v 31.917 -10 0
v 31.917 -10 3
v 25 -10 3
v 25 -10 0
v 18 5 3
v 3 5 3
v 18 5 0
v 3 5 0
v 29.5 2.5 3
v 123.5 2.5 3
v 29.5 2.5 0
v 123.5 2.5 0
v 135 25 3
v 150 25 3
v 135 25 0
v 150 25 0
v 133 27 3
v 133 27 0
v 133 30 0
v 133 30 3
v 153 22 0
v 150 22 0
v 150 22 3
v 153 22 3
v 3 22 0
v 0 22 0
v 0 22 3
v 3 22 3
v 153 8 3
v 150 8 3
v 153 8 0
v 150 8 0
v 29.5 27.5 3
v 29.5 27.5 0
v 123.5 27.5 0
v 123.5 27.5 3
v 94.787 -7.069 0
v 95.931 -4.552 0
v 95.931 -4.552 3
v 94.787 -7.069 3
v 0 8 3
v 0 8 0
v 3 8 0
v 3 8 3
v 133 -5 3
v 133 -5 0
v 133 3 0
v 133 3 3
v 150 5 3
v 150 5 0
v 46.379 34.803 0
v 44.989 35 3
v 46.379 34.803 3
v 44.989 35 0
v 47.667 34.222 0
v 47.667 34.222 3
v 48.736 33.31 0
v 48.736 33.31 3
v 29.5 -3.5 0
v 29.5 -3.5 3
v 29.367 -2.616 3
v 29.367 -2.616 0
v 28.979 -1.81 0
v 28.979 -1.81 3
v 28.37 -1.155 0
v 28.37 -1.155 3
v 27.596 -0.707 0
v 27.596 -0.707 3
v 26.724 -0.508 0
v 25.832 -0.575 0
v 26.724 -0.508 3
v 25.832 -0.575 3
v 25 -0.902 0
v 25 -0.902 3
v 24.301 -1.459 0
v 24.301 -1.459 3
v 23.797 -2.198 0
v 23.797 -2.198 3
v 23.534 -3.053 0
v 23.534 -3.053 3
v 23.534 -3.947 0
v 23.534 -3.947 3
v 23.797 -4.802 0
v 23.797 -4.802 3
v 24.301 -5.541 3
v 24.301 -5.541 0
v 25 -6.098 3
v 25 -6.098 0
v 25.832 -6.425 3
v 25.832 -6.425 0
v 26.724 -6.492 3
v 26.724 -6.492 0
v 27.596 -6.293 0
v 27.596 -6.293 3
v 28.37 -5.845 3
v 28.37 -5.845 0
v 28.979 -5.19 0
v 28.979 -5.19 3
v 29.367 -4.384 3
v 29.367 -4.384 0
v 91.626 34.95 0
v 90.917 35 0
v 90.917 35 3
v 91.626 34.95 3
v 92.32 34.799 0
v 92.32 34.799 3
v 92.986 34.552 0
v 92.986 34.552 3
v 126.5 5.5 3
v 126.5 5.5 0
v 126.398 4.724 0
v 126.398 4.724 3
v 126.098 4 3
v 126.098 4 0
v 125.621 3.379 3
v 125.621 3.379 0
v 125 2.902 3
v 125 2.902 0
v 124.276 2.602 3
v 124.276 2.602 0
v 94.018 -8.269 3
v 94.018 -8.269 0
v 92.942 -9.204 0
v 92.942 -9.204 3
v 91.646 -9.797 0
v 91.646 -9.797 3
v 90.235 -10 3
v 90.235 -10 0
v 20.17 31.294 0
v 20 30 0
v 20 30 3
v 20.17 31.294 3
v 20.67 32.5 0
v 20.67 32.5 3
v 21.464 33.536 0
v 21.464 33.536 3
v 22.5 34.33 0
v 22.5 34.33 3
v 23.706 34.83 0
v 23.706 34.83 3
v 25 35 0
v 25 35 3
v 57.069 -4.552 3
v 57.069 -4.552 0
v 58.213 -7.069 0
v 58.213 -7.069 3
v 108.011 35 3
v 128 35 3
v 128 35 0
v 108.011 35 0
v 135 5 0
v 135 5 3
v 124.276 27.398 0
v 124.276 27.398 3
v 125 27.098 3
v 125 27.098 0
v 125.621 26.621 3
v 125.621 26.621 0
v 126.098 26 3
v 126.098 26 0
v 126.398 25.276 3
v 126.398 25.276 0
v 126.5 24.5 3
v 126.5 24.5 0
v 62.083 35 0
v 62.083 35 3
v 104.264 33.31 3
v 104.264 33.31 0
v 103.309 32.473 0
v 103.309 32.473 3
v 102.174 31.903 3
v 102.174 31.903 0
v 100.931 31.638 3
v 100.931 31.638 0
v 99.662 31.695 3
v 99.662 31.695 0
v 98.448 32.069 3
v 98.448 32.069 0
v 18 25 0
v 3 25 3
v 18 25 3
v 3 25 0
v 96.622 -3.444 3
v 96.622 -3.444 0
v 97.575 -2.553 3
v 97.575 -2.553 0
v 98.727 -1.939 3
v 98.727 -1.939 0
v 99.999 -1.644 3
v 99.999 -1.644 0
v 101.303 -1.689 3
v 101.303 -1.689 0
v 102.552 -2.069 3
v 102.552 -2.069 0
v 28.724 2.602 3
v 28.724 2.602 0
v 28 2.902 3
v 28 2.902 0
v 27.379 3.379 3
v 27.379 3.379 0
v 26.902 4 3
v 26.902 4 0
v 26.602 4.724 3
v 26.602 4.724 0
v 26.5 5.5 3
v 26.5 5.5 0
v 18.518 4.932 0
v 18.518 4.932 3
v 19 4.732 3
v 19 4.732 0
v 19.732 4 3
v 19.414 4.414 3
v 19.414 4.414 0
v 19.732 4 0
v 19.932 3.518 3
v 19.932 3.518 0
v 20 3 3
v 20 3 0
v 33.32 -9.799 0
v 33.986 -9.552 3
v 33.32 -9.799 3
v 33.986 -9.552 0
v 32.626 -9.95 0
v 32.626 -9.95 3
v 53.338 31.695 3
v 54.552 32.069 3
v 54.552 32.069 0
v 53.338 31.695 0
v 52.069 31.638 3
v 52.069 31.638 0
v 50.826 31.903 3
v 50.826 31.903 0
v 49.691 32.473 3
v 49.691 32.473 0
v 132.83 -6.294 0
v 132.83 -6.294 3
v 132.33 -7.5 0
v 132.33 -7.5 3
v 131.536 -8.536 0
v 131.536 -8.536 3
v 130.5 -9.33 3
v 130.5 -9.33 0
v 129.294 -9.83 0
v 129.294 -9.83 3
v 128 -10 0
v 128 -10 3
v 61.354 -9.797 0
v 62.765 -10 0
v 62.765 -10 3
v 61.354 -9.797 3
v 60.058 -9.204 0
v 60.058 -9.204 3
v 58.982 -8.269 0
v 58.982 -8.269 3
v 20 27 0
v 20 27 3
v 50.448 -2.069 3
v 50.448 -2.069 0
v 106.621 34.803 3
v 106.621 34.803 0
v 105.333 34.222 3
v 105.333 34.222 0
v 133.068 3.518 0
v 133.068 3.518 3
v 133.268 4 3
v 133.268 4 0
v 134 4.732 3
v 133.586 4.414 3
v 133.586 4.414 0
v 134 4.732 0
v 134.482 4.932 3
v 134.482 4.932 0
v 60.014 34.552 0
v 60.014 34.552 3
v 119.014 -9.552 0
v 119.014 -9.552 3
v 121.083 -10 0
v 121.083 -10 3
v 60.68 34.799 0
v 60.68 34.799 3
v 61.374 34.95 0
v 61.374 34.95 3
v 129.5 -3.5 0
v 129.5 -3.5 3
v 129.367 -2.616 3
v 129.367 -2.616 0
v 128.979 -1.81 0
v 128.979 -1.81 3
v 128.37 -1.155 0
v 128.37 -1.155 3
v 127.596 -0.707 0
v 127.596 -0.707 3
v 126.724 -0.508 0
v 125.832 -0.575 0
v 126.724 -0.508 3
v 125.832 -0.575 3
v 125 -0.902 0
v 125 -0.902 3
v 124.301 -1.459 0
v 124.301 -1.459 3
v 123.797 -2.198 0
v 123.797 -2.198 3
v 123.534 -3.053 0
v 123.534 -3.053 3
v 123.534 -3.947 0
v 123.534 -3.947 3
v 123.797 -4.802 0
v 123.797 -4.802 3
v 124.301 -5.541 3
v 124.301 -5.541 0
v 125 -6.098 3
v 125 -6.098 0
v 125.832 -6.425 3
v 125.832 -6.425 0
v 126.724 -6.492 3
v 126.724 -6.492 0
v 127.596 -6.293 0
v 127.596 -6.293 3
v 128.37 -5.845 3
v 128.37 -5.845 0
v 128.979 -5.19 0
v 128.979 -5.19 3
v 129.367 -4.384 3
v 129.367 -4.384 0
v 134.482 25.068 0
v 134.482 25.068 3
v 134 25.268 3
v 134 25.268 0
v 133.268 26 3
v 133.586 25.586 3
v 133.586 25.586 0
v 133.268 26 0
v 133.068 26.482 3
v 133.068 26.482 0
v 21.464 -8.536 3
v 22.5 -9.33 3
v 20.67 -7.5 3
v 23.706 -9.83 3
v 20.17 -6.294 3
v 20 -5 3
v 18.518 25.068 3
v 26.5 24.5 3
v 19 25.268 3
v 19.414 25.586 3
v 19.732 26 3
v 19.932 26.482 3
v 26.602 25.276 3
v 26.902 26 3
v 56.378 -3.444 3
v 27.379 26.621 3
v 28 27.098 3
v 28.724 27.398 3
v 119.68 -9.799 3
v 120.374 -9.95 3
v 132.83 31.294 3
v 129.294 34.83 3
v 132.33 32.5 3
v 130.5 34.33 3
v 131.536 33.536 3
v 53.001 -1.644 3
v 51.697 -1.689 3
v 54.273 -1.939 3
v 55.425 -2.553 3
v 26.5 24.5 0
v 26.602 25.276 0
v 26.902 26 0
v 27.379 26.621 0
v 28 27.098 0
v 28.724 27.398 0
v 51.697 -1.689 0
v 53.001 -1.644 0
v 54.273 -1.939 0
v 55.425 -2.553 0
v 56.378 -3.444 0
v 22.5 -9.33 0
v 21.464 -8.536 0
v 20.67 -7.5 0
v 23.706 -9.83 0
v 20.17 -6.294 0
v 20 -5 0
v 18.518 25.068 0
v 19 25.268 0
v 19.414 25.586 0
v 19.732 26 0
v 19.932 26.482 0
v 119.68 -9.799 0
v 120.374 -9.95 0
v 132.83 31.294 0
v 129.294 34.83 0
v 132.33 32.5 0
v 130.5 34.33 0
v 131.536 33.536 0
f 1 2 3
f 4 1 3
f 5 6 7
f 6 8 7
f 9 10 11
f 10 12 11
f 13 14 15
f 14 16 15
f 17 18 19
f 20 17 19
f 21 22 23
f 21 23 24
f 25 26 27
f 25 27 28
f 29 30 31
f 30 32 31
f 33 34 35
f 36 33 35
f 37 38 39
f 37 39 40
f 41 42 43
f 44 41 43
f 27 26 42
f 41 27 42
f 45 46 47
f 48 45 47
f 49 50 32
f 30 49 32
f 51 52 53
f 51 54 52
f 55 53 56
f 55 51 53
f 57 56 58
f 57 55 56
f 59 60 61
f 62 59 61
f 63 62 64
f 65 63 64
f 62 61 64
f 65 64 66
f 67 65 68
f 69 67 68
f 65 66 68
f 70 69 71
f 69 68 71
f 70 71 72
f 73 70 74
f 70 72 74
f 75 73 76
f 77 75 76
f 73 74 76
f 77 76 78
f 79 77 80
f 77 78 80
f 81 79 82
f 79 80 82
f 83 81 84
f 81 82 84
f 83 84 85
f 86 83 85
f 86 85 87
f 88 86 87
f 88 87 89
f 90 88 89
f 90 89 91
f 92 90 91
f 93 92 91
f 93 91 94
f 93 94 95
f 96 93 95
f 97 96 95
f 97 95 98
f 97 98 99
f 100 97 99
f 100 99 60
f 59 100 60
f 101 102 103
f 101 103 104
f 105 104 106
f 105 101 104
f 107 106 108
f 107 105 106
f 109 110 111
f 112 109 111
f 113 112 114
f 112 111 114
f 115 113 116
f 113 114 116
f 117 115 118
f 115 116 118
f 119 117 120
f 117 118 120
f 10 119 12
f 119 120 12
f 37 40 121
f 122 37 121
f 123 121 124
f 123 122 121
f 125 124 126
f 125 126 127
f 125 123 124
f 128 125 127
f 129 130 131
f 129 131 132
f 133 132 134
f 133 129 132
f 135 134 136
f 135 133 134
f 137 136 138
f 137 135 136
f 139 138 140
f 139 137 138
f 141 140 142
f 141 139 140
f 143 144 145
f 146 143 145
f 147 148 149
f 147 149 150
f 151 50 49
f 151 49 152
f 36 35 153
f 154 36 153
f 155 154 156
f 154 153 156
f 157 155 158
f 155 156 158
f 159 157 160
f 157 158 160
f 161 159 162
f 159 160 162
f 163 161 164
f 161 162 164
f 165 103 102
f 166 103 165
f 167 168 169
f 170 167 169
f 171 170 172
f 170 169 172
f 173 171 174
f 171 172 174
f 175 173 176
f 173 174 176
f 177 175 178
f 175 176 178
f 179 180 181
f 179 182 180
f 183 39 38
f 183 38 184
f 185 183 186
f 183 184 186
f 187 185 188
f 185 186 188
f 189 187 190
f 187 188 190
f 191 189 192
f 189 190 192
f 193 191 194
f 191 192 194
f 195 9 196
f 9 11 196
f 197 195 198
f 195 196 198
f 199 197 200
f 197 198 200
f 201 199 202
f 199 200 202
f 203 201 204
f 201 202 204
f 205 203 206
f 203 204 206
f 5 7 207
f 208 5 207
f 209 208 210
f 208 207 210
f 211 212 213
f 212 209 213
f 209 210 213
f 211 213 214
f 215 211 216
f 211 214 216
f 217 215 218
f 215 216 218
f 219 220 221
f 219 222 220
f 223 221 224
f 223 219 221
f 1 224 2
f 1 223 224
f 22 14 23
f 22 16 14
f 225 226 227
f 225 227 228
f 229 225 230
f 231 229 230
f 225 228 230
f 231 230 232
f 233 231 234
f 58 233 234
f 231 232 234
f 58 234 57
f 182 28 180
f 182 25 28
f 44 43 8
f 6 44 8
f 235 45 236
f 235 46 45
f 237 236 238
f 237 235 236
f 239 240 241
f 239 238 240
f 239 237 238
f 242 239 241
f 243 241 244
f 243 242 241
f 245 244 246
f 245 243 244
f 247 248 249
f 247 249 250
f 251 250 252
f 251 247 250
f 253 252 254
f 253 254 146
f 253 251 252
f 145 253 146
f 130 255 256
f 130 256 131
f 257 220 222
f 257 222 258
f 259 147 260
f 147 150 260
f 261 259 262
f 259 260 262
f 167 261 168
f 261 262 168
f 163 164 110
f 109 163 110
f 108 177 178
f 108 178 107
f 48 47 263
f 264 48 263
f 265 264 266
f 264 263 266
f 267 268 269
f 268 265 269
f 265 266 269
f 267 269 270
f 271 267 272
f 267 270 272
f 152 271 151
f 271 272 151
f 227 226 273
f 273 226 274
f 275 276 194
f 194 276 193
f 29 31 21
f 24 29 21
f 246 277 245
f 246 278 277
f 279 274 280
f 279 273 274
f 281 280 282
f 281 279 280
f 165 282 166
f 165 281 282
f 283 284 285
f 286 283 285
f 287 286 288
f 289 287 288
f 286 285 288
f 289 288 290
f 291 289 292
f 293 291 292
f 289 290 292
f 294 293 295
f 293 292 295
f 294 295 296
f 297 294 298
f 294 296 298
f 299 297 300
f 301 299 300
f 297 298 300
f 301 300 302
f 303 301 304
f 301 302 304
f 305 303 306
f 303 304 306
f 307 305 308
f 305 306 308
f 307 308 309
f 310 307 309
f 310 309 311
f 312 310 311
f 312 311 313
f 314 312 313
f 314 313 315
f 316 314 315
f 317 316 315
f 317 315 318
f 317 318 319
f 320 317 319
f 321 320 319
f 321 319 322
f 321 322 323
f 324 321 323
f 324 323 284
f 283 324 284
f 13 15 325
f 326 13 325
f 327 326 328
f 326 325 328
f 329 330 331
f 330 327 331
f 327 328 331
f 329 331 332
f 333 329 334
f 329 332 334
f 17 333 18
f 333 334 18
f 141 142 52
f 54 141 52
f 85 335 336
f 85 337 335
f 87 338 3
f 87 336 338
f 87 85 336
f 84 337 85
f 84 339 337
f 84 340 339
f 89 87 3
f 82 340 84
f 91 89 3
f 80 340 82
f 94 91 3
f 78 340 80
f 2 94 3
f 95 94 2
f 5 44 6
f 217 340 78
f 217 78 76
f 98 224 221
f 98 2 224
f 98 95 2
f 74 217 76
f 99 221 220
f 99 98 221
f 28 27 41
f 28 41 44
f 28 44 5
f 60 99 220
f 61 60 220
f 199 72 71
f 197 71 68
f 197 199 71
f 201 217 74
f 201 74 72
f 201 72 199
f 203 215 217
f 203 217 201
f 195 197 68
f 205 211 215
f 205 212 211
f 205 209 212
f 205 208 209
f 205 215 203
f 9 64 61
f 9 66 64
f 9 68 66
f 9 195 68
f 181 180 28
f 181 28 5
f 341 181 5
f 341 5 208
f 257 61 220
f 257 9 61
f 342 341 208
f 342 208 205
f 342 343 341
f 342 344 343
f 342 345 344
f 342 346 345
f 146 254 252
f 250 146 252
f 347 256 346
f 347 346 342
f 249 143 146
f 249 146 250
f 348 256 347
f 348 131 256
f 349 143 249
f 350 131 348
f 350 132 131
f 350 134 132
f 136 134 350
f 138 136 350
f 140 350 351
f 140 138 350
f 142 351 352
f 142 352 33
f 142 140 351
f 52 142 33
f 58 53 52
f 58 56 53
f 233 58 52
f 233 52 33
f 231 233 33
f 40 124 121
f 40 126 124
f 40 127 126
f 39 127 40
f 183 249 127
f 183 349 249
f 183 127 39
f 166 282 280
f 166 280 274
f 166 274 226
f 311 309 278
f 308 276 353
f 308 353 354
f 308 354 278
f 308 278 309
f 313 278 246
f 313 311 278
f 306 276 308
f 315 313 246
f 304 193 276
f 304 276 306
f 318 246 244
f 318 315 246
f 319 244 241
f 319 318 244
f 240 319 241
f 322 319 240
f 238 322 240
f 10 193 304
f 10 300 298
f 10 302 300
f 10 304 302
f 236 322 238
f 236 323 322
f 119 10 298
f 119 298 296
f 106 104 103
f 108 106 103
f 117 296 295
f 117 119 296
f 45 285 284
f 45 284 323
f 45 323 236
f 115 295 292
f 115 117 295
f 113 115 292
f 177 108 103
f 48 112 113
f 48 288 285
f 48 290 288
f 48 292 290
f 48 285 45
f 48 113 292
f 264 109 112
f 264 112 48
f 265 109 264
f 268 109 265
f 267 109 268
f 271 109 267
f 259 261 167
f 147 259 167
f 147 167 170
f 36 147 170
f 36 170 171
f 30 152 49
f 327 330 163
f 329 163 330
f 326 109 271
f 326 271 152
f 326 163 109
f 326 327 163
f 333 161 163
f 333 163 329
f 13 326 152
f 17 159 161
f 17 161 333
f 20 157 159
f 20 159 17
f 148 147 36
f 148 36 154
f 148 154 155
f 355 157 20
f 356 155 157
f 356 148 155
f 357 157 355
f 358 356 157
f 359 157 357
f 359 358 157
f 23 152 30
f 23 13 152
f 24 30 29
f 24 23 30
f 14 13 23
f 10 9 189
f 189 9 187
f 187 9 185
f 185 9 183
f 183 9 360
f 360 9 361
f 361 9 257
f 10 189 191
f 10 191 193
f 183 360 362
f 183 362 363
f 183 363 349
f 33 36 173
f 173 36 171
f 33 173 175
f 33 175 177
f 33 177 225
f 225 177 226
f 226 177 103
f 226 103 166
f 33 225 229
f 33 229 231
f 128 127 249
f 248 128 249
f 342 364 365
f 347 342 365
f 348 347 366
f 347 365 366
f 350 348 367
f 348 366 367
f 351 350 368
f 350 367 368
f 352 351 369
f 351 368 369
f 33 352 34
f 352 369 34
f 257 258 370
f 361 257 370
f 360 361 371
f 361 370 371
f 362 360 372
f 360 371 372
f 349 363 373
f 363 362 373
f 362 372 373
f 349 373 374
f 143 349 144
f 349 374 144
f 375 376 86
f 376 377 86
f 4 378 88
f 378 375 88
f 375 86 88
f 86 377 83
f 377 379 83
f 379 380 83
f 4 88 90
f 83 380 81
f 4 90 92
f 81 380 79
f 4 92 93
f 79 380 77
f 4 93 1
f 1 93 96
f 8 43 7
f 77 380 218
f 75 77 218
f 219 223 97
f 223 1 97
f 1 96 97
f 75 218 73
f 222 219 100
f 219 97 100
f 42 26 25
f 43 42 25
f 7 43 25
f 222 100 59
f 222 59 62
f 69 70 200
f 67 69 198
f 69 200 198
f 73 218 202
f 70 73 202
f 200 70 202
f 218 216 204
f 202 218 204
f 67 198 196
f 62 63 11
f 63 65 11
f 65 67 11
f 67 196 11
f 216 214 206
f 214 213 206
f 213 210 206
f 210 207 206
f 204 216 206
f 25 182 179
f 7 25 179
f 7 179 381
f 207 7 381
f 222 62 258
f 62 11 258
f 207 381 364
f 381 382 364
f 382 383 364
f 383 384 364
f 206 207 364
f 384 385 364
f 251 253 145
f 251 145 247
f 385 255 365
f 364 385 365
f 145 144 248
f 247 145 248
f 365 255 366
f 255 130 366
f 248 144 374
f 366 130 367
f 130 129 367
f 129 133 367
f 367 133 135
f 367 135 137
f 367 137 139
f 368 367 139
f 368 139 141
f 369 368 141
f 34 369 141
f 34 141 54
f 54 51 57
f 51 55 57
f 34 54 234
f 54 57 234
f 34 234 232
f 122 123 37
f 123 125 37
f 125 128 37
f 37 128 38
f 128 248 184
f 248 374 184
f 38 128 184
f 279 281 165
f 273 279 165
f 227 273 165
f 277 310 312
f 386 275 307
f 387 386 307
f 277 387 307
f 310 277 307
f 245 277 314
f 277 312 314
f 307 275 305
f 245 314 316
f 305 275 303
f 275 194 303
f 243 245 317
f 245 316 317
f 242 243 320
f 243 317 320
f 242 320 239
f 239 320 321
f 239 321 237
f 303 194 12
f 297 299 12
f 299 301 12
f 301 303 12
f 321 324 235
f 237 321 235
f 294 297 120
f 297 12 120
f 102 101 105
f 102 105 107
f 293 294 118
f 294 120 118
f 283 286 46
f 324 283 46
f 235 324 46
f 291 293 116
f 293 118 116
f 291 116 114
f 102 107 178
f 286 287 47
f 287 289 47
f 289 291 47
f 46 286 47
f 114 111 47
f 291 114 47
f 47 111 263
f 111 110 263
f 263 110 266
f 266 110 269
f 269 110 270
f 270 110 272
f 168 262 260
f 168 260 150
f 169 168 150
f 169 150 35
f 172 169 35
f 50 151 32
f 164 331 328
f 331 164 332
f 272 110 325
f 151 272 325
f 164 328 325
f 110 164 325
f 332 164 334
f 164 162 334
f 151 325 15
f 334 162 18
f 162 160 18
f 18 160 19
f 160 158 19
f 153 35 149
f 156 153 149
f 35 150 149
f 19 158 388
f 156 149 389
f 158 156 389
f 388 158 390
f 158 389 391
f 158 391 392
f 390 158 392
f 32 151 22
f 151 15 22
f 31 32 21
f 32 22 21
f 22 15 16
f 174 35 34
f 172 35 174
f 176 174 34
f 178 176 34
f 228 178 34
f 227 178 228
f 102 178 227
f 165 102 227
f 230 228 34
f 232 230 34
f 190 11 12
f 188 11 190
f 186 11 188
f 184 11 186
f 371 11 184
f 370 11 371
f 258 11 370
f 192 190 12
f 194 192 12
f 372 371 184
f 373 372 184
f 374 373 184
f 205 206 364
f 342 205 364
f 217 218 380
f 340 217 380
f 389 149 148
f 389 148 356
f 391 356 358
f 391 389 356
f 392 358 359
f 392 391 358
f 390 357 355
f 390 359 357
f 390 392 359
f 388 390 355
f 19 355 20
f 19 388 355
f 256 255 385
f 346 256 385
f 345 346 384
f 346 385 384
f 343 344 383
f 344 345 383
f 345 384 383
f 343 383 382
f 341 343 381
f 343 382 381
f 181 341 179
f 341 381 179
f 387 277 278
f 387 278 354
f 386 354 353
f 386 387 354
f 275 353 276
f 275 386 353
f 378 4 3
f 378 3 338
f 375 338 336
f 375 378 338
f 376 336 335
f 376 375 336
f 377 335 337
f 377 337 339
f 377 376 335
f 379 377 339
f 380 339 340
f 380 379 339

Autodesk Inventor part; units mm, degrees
ref_plane "YZ Plane" through (0, 0, 0) normal (1, 0, 0) x (0, 1, 0)
ref_plane "XZ Plane" through (0, 0, 0) normal (0, 1, 0) x (-1, 0, 0)
ref_plane "XY Plane" through (0, 0, 0) normal (0, 0, 1) x (1, 0, 0)
sketch "Sketch1" plane through (0, 0, 0) normal (0, 0, 1) x (1, 0, 0)
  line L0 (20, 0) -> (133, 0)
  line L1 (153, 8) -> (153, 22)
  line L2 (133, 30) -> (20, 30)
  line L3 (0, 22) -> (0, 8)
  line L4 (150, 25) -> (135, 25)
  line L5 (133, 27) -> (133, 30)
  line L6 (3, 25) -> (18, 25)
  line L7 (20, 27) -> (20, 30)
  line L8 (3, 5) -> (18, 5)
  line L9 (20, 3) -> (20, 0)
  arc A0 (18, 25) -> (20, 27) centre (18, 27) ccw
  arc A1 (20, 3) -> (18, 5) centre (18, 3) ccw
  arc A2 (133, 27) -> (135, 25) centre (135, 27) ccw
  line L10 (150, 5) -> (135, 5)
  line L11 (0, 22) -> (3, 22)
  line L12 (3, 22) -> (3, 25)
  line L13 (0, 8) -> (3, 8)
  line L14 (3, 8) -> (3, 5)
  line L15 (150, 25) -> (150, 22)
  line L16 (150, 22) -> (153, 22)
  line L17 (150, 5) -> (150, 8)
  line L18 (150, 8) -> (153, 8)
  line L19 (133, 0) -> (133, 3)
  arc A3 (135, 5) -> (133, 3) centre (135, 3) ccw
  point P0 (0, 0)
  point P1 (133, 25)
  point P2 (20, 25)
  point P3 (20, 5)
  point P4 (133, 5)
  dimension "d31" = 5
  dimension "d33" = 5
  dimension "d36" = 5
  dimension "d37" = 113
  dimension "d39" = 2
  dimension "d46" = 2
  dimension "d59" = 3
  dimension "d60" = 3
  dimension "d61" = 3
  dimension "d62" = 3
  dimension "d64" = 14
  dimension "d65" = 20
  dimension "d66" = 3
  dimension "d67" = 3
  dimension "d68" = 14
  dimension "d70" = 3
  dimension "d75" = 2
  dimension "d76" = 20
  dimension "d88" = 20
  dimension "d89" = 20
extrude "Extrusion1" add sketch "Sketch1" along normal blind 3
sketch "Sketch3" plane through (0, 0, 3) normal (0, 0, 1) x (1, 0, 0)
  circle A0 centre (76.5, 15) radius 9
  line L0 (20, 30) -> (133, 30) projected
  line L1 (153, 8) -> (153, 22) projected
  point P0 (0, 0)
  point P1 (2, 30)
  point P2 (151, 30)
  point P3 (153, 2)
  point P4 (153, 28)
  point P5 (27, 30)
  point P6 (126, 30)
  point P7 (153, 7)
  point P8 (153, 23)
  dimension "d24" = 18
  dimension "d25" = 15
  dimension "d26" = 76.5
extrude "Extrusion3" cut sketch "Sketch3" against normal through all
sketch "Sketch4" plane through (0, 0, 3) normal (0, 0, 1) x (1, 0, 0)
  circle A0 centre (26.5, -3.5) radius 3
  circle A1 centre (76.5, 15) radius 9 projected
  line L0 (20, 0) -> (55, 0)
  line L1 (33, -10) -> (20, -10)
  line L2 (20, -10) -> (20, 0)
  line L3 (76.5, 0) -> (76.5, 30) construction
  line L4 (133, 30) -> (20, 30) construction
  circle A2 centre (126.5, -3.5) radius 3
  line L5 (133, 0) -> (98, 0)
  line L6 (120, -10) -> (133, -10)
  line L7 (133, -10) -> (133, 0)
  line L8 (33, -10) -> (55, 0)
  line L9 (120, -10) -> (98, 0)
  line L10 (55, 0) -> (59.5455, -10)
  line L11 (98, 0) -> (93.4545, -10)
  line L12 (93.4545, -10) -> (59.5455, -10)
  line L13 (55, 0) -> (98, 0)
  line L14 (133, 0) -> (20, 0) projected
  point P0 (0, 0)
  point P1 (126, 30)
  point P2 (27, 30)
  dimension "d40" = 6
  dimension "d41" = 50
  dimension "d48" = 10
  dimension "d49" = 13
  dimension "d50" = 3.5
  dimension "d54" = 35
  dimension "d55" = 35
extrude "Extrusion6" add sketch "Sketch4" against normal blind 3 contours L5 L7 L6 L9 | L13 L11 L12 L10 | L0 L8 L1 L2
sketch "Sketch7" plane through (0, 0, 3) normal (0, 0, 1) x (1, 0, 0)
  line L0 (20, 30) -> (20, 35)
  line L1 (20, 35) -> (47.7273, 35)
  line L2 (47.7273, 35) -> (50, 30)
  line L3 (20, 30) -> (133, 30) projected
  line L4 (50, 30) -> (61, 35)
  line L5 (55, 0) -> (59.5455, -10) projected
  line L6 (33, -10) -> (55, 0) projected
  line L7 (133, 30) -> (133, 35)
  line L8 (133, 35) -> (105.2727, 35)
  line L9 (105.2727, 35) -> (103, 30)
  line L10 (103, 30) -> (92, 35)
  line L11 (92, 35) -> (61, 35)
  line L12 (98, 0) -> (120, -10) projected
  line L13 (93.4545, -10) -> (98, 0) projected
  point P0 (0, 0)
  point P1 (57.069, -4.5518)
  point P2 (58.2132, -7.069)
  point P3 (33.986, -9.5518)
  point P4 (50.4482, -2.069)
  point P5 (102.5518, -2.069)
  point P6 (119.014, -9.5518)
  point P7 (94.7868, -7.069)
  point P8 (95.931, -4.5518)
  dimension "d80" = 5
  dimension "d81" = 30
  dimension "d82" = 30
extrude "Extrusion7" add sketch "Sketch7" against normal blind 3
fillet "Fillet4" radius 5 2 edges at (50, 30, 1.5) (103, 30, 1.5)
fillet "Fillet5" radius 5 2 edges at (55, 0, 1.5) (98, 0, 1.5)
fillet "Fillet6" radius 5 12 edges at (20, -10, 1.5) (20, 35, 1.5) (47.7273, 35, 1.5) (61, 35, 1.5) (92, 35, 1.5) (105.2727, 35, 1.5) (133, 35, 1.5) (133, -10, 1.5) (120, -10, 1.5) (93.4545, -10, 1.5) (59.5455, -10, 1.5) (33, -10, 1.5)
sketch "Sketch10" plane through (0, 0, 0) normal (0, 0, -1) x (-1, 0, 0)
  line L0 (-123.5, 2.5) -> (-29.5, 2.5)
  line L1 (-26.5, 5.5) -> (-26.5, 24.5)
  line L2 (-29.5, 27.5) -> (-123.5, 27.5)
  line L3 (-126.5, 24.5) -> (-126.5, 5.5)
  circle A0 centre (-76.5, 15) radius 9 projected
  line L4 (-126.5, 2.5) -> (-26.5, 27.5) construction
  line L5 (-26.5, 2.5) -> (-126.5, 27.5) construction
  arc A1 (-123.5, 27.5) -> (-126.5, 24.5) centre (-123.5, 24.5) ccw
  arc A2 (-26.5, 24.5) -> (-29.5, 27.5) centre (-29.5, 24.5) ccw
  arc A3 (-29.5, 2.5) -> (-26.5, 5.5) centre (-29.5, 5.5) ccw
  arc A4 (-126.5, 5.5) -> (-123.5, 2.5) centre (-123.5, 5.5) ccw
  point P0 (0, 0)
  dimension "d90" = 25
  dimension "d91" = 100
  dimension "d92" = 3
extrude "Extrusion8" cut sketch "Sketch10" against normal through all
properties part number "27030914FacePlate"
